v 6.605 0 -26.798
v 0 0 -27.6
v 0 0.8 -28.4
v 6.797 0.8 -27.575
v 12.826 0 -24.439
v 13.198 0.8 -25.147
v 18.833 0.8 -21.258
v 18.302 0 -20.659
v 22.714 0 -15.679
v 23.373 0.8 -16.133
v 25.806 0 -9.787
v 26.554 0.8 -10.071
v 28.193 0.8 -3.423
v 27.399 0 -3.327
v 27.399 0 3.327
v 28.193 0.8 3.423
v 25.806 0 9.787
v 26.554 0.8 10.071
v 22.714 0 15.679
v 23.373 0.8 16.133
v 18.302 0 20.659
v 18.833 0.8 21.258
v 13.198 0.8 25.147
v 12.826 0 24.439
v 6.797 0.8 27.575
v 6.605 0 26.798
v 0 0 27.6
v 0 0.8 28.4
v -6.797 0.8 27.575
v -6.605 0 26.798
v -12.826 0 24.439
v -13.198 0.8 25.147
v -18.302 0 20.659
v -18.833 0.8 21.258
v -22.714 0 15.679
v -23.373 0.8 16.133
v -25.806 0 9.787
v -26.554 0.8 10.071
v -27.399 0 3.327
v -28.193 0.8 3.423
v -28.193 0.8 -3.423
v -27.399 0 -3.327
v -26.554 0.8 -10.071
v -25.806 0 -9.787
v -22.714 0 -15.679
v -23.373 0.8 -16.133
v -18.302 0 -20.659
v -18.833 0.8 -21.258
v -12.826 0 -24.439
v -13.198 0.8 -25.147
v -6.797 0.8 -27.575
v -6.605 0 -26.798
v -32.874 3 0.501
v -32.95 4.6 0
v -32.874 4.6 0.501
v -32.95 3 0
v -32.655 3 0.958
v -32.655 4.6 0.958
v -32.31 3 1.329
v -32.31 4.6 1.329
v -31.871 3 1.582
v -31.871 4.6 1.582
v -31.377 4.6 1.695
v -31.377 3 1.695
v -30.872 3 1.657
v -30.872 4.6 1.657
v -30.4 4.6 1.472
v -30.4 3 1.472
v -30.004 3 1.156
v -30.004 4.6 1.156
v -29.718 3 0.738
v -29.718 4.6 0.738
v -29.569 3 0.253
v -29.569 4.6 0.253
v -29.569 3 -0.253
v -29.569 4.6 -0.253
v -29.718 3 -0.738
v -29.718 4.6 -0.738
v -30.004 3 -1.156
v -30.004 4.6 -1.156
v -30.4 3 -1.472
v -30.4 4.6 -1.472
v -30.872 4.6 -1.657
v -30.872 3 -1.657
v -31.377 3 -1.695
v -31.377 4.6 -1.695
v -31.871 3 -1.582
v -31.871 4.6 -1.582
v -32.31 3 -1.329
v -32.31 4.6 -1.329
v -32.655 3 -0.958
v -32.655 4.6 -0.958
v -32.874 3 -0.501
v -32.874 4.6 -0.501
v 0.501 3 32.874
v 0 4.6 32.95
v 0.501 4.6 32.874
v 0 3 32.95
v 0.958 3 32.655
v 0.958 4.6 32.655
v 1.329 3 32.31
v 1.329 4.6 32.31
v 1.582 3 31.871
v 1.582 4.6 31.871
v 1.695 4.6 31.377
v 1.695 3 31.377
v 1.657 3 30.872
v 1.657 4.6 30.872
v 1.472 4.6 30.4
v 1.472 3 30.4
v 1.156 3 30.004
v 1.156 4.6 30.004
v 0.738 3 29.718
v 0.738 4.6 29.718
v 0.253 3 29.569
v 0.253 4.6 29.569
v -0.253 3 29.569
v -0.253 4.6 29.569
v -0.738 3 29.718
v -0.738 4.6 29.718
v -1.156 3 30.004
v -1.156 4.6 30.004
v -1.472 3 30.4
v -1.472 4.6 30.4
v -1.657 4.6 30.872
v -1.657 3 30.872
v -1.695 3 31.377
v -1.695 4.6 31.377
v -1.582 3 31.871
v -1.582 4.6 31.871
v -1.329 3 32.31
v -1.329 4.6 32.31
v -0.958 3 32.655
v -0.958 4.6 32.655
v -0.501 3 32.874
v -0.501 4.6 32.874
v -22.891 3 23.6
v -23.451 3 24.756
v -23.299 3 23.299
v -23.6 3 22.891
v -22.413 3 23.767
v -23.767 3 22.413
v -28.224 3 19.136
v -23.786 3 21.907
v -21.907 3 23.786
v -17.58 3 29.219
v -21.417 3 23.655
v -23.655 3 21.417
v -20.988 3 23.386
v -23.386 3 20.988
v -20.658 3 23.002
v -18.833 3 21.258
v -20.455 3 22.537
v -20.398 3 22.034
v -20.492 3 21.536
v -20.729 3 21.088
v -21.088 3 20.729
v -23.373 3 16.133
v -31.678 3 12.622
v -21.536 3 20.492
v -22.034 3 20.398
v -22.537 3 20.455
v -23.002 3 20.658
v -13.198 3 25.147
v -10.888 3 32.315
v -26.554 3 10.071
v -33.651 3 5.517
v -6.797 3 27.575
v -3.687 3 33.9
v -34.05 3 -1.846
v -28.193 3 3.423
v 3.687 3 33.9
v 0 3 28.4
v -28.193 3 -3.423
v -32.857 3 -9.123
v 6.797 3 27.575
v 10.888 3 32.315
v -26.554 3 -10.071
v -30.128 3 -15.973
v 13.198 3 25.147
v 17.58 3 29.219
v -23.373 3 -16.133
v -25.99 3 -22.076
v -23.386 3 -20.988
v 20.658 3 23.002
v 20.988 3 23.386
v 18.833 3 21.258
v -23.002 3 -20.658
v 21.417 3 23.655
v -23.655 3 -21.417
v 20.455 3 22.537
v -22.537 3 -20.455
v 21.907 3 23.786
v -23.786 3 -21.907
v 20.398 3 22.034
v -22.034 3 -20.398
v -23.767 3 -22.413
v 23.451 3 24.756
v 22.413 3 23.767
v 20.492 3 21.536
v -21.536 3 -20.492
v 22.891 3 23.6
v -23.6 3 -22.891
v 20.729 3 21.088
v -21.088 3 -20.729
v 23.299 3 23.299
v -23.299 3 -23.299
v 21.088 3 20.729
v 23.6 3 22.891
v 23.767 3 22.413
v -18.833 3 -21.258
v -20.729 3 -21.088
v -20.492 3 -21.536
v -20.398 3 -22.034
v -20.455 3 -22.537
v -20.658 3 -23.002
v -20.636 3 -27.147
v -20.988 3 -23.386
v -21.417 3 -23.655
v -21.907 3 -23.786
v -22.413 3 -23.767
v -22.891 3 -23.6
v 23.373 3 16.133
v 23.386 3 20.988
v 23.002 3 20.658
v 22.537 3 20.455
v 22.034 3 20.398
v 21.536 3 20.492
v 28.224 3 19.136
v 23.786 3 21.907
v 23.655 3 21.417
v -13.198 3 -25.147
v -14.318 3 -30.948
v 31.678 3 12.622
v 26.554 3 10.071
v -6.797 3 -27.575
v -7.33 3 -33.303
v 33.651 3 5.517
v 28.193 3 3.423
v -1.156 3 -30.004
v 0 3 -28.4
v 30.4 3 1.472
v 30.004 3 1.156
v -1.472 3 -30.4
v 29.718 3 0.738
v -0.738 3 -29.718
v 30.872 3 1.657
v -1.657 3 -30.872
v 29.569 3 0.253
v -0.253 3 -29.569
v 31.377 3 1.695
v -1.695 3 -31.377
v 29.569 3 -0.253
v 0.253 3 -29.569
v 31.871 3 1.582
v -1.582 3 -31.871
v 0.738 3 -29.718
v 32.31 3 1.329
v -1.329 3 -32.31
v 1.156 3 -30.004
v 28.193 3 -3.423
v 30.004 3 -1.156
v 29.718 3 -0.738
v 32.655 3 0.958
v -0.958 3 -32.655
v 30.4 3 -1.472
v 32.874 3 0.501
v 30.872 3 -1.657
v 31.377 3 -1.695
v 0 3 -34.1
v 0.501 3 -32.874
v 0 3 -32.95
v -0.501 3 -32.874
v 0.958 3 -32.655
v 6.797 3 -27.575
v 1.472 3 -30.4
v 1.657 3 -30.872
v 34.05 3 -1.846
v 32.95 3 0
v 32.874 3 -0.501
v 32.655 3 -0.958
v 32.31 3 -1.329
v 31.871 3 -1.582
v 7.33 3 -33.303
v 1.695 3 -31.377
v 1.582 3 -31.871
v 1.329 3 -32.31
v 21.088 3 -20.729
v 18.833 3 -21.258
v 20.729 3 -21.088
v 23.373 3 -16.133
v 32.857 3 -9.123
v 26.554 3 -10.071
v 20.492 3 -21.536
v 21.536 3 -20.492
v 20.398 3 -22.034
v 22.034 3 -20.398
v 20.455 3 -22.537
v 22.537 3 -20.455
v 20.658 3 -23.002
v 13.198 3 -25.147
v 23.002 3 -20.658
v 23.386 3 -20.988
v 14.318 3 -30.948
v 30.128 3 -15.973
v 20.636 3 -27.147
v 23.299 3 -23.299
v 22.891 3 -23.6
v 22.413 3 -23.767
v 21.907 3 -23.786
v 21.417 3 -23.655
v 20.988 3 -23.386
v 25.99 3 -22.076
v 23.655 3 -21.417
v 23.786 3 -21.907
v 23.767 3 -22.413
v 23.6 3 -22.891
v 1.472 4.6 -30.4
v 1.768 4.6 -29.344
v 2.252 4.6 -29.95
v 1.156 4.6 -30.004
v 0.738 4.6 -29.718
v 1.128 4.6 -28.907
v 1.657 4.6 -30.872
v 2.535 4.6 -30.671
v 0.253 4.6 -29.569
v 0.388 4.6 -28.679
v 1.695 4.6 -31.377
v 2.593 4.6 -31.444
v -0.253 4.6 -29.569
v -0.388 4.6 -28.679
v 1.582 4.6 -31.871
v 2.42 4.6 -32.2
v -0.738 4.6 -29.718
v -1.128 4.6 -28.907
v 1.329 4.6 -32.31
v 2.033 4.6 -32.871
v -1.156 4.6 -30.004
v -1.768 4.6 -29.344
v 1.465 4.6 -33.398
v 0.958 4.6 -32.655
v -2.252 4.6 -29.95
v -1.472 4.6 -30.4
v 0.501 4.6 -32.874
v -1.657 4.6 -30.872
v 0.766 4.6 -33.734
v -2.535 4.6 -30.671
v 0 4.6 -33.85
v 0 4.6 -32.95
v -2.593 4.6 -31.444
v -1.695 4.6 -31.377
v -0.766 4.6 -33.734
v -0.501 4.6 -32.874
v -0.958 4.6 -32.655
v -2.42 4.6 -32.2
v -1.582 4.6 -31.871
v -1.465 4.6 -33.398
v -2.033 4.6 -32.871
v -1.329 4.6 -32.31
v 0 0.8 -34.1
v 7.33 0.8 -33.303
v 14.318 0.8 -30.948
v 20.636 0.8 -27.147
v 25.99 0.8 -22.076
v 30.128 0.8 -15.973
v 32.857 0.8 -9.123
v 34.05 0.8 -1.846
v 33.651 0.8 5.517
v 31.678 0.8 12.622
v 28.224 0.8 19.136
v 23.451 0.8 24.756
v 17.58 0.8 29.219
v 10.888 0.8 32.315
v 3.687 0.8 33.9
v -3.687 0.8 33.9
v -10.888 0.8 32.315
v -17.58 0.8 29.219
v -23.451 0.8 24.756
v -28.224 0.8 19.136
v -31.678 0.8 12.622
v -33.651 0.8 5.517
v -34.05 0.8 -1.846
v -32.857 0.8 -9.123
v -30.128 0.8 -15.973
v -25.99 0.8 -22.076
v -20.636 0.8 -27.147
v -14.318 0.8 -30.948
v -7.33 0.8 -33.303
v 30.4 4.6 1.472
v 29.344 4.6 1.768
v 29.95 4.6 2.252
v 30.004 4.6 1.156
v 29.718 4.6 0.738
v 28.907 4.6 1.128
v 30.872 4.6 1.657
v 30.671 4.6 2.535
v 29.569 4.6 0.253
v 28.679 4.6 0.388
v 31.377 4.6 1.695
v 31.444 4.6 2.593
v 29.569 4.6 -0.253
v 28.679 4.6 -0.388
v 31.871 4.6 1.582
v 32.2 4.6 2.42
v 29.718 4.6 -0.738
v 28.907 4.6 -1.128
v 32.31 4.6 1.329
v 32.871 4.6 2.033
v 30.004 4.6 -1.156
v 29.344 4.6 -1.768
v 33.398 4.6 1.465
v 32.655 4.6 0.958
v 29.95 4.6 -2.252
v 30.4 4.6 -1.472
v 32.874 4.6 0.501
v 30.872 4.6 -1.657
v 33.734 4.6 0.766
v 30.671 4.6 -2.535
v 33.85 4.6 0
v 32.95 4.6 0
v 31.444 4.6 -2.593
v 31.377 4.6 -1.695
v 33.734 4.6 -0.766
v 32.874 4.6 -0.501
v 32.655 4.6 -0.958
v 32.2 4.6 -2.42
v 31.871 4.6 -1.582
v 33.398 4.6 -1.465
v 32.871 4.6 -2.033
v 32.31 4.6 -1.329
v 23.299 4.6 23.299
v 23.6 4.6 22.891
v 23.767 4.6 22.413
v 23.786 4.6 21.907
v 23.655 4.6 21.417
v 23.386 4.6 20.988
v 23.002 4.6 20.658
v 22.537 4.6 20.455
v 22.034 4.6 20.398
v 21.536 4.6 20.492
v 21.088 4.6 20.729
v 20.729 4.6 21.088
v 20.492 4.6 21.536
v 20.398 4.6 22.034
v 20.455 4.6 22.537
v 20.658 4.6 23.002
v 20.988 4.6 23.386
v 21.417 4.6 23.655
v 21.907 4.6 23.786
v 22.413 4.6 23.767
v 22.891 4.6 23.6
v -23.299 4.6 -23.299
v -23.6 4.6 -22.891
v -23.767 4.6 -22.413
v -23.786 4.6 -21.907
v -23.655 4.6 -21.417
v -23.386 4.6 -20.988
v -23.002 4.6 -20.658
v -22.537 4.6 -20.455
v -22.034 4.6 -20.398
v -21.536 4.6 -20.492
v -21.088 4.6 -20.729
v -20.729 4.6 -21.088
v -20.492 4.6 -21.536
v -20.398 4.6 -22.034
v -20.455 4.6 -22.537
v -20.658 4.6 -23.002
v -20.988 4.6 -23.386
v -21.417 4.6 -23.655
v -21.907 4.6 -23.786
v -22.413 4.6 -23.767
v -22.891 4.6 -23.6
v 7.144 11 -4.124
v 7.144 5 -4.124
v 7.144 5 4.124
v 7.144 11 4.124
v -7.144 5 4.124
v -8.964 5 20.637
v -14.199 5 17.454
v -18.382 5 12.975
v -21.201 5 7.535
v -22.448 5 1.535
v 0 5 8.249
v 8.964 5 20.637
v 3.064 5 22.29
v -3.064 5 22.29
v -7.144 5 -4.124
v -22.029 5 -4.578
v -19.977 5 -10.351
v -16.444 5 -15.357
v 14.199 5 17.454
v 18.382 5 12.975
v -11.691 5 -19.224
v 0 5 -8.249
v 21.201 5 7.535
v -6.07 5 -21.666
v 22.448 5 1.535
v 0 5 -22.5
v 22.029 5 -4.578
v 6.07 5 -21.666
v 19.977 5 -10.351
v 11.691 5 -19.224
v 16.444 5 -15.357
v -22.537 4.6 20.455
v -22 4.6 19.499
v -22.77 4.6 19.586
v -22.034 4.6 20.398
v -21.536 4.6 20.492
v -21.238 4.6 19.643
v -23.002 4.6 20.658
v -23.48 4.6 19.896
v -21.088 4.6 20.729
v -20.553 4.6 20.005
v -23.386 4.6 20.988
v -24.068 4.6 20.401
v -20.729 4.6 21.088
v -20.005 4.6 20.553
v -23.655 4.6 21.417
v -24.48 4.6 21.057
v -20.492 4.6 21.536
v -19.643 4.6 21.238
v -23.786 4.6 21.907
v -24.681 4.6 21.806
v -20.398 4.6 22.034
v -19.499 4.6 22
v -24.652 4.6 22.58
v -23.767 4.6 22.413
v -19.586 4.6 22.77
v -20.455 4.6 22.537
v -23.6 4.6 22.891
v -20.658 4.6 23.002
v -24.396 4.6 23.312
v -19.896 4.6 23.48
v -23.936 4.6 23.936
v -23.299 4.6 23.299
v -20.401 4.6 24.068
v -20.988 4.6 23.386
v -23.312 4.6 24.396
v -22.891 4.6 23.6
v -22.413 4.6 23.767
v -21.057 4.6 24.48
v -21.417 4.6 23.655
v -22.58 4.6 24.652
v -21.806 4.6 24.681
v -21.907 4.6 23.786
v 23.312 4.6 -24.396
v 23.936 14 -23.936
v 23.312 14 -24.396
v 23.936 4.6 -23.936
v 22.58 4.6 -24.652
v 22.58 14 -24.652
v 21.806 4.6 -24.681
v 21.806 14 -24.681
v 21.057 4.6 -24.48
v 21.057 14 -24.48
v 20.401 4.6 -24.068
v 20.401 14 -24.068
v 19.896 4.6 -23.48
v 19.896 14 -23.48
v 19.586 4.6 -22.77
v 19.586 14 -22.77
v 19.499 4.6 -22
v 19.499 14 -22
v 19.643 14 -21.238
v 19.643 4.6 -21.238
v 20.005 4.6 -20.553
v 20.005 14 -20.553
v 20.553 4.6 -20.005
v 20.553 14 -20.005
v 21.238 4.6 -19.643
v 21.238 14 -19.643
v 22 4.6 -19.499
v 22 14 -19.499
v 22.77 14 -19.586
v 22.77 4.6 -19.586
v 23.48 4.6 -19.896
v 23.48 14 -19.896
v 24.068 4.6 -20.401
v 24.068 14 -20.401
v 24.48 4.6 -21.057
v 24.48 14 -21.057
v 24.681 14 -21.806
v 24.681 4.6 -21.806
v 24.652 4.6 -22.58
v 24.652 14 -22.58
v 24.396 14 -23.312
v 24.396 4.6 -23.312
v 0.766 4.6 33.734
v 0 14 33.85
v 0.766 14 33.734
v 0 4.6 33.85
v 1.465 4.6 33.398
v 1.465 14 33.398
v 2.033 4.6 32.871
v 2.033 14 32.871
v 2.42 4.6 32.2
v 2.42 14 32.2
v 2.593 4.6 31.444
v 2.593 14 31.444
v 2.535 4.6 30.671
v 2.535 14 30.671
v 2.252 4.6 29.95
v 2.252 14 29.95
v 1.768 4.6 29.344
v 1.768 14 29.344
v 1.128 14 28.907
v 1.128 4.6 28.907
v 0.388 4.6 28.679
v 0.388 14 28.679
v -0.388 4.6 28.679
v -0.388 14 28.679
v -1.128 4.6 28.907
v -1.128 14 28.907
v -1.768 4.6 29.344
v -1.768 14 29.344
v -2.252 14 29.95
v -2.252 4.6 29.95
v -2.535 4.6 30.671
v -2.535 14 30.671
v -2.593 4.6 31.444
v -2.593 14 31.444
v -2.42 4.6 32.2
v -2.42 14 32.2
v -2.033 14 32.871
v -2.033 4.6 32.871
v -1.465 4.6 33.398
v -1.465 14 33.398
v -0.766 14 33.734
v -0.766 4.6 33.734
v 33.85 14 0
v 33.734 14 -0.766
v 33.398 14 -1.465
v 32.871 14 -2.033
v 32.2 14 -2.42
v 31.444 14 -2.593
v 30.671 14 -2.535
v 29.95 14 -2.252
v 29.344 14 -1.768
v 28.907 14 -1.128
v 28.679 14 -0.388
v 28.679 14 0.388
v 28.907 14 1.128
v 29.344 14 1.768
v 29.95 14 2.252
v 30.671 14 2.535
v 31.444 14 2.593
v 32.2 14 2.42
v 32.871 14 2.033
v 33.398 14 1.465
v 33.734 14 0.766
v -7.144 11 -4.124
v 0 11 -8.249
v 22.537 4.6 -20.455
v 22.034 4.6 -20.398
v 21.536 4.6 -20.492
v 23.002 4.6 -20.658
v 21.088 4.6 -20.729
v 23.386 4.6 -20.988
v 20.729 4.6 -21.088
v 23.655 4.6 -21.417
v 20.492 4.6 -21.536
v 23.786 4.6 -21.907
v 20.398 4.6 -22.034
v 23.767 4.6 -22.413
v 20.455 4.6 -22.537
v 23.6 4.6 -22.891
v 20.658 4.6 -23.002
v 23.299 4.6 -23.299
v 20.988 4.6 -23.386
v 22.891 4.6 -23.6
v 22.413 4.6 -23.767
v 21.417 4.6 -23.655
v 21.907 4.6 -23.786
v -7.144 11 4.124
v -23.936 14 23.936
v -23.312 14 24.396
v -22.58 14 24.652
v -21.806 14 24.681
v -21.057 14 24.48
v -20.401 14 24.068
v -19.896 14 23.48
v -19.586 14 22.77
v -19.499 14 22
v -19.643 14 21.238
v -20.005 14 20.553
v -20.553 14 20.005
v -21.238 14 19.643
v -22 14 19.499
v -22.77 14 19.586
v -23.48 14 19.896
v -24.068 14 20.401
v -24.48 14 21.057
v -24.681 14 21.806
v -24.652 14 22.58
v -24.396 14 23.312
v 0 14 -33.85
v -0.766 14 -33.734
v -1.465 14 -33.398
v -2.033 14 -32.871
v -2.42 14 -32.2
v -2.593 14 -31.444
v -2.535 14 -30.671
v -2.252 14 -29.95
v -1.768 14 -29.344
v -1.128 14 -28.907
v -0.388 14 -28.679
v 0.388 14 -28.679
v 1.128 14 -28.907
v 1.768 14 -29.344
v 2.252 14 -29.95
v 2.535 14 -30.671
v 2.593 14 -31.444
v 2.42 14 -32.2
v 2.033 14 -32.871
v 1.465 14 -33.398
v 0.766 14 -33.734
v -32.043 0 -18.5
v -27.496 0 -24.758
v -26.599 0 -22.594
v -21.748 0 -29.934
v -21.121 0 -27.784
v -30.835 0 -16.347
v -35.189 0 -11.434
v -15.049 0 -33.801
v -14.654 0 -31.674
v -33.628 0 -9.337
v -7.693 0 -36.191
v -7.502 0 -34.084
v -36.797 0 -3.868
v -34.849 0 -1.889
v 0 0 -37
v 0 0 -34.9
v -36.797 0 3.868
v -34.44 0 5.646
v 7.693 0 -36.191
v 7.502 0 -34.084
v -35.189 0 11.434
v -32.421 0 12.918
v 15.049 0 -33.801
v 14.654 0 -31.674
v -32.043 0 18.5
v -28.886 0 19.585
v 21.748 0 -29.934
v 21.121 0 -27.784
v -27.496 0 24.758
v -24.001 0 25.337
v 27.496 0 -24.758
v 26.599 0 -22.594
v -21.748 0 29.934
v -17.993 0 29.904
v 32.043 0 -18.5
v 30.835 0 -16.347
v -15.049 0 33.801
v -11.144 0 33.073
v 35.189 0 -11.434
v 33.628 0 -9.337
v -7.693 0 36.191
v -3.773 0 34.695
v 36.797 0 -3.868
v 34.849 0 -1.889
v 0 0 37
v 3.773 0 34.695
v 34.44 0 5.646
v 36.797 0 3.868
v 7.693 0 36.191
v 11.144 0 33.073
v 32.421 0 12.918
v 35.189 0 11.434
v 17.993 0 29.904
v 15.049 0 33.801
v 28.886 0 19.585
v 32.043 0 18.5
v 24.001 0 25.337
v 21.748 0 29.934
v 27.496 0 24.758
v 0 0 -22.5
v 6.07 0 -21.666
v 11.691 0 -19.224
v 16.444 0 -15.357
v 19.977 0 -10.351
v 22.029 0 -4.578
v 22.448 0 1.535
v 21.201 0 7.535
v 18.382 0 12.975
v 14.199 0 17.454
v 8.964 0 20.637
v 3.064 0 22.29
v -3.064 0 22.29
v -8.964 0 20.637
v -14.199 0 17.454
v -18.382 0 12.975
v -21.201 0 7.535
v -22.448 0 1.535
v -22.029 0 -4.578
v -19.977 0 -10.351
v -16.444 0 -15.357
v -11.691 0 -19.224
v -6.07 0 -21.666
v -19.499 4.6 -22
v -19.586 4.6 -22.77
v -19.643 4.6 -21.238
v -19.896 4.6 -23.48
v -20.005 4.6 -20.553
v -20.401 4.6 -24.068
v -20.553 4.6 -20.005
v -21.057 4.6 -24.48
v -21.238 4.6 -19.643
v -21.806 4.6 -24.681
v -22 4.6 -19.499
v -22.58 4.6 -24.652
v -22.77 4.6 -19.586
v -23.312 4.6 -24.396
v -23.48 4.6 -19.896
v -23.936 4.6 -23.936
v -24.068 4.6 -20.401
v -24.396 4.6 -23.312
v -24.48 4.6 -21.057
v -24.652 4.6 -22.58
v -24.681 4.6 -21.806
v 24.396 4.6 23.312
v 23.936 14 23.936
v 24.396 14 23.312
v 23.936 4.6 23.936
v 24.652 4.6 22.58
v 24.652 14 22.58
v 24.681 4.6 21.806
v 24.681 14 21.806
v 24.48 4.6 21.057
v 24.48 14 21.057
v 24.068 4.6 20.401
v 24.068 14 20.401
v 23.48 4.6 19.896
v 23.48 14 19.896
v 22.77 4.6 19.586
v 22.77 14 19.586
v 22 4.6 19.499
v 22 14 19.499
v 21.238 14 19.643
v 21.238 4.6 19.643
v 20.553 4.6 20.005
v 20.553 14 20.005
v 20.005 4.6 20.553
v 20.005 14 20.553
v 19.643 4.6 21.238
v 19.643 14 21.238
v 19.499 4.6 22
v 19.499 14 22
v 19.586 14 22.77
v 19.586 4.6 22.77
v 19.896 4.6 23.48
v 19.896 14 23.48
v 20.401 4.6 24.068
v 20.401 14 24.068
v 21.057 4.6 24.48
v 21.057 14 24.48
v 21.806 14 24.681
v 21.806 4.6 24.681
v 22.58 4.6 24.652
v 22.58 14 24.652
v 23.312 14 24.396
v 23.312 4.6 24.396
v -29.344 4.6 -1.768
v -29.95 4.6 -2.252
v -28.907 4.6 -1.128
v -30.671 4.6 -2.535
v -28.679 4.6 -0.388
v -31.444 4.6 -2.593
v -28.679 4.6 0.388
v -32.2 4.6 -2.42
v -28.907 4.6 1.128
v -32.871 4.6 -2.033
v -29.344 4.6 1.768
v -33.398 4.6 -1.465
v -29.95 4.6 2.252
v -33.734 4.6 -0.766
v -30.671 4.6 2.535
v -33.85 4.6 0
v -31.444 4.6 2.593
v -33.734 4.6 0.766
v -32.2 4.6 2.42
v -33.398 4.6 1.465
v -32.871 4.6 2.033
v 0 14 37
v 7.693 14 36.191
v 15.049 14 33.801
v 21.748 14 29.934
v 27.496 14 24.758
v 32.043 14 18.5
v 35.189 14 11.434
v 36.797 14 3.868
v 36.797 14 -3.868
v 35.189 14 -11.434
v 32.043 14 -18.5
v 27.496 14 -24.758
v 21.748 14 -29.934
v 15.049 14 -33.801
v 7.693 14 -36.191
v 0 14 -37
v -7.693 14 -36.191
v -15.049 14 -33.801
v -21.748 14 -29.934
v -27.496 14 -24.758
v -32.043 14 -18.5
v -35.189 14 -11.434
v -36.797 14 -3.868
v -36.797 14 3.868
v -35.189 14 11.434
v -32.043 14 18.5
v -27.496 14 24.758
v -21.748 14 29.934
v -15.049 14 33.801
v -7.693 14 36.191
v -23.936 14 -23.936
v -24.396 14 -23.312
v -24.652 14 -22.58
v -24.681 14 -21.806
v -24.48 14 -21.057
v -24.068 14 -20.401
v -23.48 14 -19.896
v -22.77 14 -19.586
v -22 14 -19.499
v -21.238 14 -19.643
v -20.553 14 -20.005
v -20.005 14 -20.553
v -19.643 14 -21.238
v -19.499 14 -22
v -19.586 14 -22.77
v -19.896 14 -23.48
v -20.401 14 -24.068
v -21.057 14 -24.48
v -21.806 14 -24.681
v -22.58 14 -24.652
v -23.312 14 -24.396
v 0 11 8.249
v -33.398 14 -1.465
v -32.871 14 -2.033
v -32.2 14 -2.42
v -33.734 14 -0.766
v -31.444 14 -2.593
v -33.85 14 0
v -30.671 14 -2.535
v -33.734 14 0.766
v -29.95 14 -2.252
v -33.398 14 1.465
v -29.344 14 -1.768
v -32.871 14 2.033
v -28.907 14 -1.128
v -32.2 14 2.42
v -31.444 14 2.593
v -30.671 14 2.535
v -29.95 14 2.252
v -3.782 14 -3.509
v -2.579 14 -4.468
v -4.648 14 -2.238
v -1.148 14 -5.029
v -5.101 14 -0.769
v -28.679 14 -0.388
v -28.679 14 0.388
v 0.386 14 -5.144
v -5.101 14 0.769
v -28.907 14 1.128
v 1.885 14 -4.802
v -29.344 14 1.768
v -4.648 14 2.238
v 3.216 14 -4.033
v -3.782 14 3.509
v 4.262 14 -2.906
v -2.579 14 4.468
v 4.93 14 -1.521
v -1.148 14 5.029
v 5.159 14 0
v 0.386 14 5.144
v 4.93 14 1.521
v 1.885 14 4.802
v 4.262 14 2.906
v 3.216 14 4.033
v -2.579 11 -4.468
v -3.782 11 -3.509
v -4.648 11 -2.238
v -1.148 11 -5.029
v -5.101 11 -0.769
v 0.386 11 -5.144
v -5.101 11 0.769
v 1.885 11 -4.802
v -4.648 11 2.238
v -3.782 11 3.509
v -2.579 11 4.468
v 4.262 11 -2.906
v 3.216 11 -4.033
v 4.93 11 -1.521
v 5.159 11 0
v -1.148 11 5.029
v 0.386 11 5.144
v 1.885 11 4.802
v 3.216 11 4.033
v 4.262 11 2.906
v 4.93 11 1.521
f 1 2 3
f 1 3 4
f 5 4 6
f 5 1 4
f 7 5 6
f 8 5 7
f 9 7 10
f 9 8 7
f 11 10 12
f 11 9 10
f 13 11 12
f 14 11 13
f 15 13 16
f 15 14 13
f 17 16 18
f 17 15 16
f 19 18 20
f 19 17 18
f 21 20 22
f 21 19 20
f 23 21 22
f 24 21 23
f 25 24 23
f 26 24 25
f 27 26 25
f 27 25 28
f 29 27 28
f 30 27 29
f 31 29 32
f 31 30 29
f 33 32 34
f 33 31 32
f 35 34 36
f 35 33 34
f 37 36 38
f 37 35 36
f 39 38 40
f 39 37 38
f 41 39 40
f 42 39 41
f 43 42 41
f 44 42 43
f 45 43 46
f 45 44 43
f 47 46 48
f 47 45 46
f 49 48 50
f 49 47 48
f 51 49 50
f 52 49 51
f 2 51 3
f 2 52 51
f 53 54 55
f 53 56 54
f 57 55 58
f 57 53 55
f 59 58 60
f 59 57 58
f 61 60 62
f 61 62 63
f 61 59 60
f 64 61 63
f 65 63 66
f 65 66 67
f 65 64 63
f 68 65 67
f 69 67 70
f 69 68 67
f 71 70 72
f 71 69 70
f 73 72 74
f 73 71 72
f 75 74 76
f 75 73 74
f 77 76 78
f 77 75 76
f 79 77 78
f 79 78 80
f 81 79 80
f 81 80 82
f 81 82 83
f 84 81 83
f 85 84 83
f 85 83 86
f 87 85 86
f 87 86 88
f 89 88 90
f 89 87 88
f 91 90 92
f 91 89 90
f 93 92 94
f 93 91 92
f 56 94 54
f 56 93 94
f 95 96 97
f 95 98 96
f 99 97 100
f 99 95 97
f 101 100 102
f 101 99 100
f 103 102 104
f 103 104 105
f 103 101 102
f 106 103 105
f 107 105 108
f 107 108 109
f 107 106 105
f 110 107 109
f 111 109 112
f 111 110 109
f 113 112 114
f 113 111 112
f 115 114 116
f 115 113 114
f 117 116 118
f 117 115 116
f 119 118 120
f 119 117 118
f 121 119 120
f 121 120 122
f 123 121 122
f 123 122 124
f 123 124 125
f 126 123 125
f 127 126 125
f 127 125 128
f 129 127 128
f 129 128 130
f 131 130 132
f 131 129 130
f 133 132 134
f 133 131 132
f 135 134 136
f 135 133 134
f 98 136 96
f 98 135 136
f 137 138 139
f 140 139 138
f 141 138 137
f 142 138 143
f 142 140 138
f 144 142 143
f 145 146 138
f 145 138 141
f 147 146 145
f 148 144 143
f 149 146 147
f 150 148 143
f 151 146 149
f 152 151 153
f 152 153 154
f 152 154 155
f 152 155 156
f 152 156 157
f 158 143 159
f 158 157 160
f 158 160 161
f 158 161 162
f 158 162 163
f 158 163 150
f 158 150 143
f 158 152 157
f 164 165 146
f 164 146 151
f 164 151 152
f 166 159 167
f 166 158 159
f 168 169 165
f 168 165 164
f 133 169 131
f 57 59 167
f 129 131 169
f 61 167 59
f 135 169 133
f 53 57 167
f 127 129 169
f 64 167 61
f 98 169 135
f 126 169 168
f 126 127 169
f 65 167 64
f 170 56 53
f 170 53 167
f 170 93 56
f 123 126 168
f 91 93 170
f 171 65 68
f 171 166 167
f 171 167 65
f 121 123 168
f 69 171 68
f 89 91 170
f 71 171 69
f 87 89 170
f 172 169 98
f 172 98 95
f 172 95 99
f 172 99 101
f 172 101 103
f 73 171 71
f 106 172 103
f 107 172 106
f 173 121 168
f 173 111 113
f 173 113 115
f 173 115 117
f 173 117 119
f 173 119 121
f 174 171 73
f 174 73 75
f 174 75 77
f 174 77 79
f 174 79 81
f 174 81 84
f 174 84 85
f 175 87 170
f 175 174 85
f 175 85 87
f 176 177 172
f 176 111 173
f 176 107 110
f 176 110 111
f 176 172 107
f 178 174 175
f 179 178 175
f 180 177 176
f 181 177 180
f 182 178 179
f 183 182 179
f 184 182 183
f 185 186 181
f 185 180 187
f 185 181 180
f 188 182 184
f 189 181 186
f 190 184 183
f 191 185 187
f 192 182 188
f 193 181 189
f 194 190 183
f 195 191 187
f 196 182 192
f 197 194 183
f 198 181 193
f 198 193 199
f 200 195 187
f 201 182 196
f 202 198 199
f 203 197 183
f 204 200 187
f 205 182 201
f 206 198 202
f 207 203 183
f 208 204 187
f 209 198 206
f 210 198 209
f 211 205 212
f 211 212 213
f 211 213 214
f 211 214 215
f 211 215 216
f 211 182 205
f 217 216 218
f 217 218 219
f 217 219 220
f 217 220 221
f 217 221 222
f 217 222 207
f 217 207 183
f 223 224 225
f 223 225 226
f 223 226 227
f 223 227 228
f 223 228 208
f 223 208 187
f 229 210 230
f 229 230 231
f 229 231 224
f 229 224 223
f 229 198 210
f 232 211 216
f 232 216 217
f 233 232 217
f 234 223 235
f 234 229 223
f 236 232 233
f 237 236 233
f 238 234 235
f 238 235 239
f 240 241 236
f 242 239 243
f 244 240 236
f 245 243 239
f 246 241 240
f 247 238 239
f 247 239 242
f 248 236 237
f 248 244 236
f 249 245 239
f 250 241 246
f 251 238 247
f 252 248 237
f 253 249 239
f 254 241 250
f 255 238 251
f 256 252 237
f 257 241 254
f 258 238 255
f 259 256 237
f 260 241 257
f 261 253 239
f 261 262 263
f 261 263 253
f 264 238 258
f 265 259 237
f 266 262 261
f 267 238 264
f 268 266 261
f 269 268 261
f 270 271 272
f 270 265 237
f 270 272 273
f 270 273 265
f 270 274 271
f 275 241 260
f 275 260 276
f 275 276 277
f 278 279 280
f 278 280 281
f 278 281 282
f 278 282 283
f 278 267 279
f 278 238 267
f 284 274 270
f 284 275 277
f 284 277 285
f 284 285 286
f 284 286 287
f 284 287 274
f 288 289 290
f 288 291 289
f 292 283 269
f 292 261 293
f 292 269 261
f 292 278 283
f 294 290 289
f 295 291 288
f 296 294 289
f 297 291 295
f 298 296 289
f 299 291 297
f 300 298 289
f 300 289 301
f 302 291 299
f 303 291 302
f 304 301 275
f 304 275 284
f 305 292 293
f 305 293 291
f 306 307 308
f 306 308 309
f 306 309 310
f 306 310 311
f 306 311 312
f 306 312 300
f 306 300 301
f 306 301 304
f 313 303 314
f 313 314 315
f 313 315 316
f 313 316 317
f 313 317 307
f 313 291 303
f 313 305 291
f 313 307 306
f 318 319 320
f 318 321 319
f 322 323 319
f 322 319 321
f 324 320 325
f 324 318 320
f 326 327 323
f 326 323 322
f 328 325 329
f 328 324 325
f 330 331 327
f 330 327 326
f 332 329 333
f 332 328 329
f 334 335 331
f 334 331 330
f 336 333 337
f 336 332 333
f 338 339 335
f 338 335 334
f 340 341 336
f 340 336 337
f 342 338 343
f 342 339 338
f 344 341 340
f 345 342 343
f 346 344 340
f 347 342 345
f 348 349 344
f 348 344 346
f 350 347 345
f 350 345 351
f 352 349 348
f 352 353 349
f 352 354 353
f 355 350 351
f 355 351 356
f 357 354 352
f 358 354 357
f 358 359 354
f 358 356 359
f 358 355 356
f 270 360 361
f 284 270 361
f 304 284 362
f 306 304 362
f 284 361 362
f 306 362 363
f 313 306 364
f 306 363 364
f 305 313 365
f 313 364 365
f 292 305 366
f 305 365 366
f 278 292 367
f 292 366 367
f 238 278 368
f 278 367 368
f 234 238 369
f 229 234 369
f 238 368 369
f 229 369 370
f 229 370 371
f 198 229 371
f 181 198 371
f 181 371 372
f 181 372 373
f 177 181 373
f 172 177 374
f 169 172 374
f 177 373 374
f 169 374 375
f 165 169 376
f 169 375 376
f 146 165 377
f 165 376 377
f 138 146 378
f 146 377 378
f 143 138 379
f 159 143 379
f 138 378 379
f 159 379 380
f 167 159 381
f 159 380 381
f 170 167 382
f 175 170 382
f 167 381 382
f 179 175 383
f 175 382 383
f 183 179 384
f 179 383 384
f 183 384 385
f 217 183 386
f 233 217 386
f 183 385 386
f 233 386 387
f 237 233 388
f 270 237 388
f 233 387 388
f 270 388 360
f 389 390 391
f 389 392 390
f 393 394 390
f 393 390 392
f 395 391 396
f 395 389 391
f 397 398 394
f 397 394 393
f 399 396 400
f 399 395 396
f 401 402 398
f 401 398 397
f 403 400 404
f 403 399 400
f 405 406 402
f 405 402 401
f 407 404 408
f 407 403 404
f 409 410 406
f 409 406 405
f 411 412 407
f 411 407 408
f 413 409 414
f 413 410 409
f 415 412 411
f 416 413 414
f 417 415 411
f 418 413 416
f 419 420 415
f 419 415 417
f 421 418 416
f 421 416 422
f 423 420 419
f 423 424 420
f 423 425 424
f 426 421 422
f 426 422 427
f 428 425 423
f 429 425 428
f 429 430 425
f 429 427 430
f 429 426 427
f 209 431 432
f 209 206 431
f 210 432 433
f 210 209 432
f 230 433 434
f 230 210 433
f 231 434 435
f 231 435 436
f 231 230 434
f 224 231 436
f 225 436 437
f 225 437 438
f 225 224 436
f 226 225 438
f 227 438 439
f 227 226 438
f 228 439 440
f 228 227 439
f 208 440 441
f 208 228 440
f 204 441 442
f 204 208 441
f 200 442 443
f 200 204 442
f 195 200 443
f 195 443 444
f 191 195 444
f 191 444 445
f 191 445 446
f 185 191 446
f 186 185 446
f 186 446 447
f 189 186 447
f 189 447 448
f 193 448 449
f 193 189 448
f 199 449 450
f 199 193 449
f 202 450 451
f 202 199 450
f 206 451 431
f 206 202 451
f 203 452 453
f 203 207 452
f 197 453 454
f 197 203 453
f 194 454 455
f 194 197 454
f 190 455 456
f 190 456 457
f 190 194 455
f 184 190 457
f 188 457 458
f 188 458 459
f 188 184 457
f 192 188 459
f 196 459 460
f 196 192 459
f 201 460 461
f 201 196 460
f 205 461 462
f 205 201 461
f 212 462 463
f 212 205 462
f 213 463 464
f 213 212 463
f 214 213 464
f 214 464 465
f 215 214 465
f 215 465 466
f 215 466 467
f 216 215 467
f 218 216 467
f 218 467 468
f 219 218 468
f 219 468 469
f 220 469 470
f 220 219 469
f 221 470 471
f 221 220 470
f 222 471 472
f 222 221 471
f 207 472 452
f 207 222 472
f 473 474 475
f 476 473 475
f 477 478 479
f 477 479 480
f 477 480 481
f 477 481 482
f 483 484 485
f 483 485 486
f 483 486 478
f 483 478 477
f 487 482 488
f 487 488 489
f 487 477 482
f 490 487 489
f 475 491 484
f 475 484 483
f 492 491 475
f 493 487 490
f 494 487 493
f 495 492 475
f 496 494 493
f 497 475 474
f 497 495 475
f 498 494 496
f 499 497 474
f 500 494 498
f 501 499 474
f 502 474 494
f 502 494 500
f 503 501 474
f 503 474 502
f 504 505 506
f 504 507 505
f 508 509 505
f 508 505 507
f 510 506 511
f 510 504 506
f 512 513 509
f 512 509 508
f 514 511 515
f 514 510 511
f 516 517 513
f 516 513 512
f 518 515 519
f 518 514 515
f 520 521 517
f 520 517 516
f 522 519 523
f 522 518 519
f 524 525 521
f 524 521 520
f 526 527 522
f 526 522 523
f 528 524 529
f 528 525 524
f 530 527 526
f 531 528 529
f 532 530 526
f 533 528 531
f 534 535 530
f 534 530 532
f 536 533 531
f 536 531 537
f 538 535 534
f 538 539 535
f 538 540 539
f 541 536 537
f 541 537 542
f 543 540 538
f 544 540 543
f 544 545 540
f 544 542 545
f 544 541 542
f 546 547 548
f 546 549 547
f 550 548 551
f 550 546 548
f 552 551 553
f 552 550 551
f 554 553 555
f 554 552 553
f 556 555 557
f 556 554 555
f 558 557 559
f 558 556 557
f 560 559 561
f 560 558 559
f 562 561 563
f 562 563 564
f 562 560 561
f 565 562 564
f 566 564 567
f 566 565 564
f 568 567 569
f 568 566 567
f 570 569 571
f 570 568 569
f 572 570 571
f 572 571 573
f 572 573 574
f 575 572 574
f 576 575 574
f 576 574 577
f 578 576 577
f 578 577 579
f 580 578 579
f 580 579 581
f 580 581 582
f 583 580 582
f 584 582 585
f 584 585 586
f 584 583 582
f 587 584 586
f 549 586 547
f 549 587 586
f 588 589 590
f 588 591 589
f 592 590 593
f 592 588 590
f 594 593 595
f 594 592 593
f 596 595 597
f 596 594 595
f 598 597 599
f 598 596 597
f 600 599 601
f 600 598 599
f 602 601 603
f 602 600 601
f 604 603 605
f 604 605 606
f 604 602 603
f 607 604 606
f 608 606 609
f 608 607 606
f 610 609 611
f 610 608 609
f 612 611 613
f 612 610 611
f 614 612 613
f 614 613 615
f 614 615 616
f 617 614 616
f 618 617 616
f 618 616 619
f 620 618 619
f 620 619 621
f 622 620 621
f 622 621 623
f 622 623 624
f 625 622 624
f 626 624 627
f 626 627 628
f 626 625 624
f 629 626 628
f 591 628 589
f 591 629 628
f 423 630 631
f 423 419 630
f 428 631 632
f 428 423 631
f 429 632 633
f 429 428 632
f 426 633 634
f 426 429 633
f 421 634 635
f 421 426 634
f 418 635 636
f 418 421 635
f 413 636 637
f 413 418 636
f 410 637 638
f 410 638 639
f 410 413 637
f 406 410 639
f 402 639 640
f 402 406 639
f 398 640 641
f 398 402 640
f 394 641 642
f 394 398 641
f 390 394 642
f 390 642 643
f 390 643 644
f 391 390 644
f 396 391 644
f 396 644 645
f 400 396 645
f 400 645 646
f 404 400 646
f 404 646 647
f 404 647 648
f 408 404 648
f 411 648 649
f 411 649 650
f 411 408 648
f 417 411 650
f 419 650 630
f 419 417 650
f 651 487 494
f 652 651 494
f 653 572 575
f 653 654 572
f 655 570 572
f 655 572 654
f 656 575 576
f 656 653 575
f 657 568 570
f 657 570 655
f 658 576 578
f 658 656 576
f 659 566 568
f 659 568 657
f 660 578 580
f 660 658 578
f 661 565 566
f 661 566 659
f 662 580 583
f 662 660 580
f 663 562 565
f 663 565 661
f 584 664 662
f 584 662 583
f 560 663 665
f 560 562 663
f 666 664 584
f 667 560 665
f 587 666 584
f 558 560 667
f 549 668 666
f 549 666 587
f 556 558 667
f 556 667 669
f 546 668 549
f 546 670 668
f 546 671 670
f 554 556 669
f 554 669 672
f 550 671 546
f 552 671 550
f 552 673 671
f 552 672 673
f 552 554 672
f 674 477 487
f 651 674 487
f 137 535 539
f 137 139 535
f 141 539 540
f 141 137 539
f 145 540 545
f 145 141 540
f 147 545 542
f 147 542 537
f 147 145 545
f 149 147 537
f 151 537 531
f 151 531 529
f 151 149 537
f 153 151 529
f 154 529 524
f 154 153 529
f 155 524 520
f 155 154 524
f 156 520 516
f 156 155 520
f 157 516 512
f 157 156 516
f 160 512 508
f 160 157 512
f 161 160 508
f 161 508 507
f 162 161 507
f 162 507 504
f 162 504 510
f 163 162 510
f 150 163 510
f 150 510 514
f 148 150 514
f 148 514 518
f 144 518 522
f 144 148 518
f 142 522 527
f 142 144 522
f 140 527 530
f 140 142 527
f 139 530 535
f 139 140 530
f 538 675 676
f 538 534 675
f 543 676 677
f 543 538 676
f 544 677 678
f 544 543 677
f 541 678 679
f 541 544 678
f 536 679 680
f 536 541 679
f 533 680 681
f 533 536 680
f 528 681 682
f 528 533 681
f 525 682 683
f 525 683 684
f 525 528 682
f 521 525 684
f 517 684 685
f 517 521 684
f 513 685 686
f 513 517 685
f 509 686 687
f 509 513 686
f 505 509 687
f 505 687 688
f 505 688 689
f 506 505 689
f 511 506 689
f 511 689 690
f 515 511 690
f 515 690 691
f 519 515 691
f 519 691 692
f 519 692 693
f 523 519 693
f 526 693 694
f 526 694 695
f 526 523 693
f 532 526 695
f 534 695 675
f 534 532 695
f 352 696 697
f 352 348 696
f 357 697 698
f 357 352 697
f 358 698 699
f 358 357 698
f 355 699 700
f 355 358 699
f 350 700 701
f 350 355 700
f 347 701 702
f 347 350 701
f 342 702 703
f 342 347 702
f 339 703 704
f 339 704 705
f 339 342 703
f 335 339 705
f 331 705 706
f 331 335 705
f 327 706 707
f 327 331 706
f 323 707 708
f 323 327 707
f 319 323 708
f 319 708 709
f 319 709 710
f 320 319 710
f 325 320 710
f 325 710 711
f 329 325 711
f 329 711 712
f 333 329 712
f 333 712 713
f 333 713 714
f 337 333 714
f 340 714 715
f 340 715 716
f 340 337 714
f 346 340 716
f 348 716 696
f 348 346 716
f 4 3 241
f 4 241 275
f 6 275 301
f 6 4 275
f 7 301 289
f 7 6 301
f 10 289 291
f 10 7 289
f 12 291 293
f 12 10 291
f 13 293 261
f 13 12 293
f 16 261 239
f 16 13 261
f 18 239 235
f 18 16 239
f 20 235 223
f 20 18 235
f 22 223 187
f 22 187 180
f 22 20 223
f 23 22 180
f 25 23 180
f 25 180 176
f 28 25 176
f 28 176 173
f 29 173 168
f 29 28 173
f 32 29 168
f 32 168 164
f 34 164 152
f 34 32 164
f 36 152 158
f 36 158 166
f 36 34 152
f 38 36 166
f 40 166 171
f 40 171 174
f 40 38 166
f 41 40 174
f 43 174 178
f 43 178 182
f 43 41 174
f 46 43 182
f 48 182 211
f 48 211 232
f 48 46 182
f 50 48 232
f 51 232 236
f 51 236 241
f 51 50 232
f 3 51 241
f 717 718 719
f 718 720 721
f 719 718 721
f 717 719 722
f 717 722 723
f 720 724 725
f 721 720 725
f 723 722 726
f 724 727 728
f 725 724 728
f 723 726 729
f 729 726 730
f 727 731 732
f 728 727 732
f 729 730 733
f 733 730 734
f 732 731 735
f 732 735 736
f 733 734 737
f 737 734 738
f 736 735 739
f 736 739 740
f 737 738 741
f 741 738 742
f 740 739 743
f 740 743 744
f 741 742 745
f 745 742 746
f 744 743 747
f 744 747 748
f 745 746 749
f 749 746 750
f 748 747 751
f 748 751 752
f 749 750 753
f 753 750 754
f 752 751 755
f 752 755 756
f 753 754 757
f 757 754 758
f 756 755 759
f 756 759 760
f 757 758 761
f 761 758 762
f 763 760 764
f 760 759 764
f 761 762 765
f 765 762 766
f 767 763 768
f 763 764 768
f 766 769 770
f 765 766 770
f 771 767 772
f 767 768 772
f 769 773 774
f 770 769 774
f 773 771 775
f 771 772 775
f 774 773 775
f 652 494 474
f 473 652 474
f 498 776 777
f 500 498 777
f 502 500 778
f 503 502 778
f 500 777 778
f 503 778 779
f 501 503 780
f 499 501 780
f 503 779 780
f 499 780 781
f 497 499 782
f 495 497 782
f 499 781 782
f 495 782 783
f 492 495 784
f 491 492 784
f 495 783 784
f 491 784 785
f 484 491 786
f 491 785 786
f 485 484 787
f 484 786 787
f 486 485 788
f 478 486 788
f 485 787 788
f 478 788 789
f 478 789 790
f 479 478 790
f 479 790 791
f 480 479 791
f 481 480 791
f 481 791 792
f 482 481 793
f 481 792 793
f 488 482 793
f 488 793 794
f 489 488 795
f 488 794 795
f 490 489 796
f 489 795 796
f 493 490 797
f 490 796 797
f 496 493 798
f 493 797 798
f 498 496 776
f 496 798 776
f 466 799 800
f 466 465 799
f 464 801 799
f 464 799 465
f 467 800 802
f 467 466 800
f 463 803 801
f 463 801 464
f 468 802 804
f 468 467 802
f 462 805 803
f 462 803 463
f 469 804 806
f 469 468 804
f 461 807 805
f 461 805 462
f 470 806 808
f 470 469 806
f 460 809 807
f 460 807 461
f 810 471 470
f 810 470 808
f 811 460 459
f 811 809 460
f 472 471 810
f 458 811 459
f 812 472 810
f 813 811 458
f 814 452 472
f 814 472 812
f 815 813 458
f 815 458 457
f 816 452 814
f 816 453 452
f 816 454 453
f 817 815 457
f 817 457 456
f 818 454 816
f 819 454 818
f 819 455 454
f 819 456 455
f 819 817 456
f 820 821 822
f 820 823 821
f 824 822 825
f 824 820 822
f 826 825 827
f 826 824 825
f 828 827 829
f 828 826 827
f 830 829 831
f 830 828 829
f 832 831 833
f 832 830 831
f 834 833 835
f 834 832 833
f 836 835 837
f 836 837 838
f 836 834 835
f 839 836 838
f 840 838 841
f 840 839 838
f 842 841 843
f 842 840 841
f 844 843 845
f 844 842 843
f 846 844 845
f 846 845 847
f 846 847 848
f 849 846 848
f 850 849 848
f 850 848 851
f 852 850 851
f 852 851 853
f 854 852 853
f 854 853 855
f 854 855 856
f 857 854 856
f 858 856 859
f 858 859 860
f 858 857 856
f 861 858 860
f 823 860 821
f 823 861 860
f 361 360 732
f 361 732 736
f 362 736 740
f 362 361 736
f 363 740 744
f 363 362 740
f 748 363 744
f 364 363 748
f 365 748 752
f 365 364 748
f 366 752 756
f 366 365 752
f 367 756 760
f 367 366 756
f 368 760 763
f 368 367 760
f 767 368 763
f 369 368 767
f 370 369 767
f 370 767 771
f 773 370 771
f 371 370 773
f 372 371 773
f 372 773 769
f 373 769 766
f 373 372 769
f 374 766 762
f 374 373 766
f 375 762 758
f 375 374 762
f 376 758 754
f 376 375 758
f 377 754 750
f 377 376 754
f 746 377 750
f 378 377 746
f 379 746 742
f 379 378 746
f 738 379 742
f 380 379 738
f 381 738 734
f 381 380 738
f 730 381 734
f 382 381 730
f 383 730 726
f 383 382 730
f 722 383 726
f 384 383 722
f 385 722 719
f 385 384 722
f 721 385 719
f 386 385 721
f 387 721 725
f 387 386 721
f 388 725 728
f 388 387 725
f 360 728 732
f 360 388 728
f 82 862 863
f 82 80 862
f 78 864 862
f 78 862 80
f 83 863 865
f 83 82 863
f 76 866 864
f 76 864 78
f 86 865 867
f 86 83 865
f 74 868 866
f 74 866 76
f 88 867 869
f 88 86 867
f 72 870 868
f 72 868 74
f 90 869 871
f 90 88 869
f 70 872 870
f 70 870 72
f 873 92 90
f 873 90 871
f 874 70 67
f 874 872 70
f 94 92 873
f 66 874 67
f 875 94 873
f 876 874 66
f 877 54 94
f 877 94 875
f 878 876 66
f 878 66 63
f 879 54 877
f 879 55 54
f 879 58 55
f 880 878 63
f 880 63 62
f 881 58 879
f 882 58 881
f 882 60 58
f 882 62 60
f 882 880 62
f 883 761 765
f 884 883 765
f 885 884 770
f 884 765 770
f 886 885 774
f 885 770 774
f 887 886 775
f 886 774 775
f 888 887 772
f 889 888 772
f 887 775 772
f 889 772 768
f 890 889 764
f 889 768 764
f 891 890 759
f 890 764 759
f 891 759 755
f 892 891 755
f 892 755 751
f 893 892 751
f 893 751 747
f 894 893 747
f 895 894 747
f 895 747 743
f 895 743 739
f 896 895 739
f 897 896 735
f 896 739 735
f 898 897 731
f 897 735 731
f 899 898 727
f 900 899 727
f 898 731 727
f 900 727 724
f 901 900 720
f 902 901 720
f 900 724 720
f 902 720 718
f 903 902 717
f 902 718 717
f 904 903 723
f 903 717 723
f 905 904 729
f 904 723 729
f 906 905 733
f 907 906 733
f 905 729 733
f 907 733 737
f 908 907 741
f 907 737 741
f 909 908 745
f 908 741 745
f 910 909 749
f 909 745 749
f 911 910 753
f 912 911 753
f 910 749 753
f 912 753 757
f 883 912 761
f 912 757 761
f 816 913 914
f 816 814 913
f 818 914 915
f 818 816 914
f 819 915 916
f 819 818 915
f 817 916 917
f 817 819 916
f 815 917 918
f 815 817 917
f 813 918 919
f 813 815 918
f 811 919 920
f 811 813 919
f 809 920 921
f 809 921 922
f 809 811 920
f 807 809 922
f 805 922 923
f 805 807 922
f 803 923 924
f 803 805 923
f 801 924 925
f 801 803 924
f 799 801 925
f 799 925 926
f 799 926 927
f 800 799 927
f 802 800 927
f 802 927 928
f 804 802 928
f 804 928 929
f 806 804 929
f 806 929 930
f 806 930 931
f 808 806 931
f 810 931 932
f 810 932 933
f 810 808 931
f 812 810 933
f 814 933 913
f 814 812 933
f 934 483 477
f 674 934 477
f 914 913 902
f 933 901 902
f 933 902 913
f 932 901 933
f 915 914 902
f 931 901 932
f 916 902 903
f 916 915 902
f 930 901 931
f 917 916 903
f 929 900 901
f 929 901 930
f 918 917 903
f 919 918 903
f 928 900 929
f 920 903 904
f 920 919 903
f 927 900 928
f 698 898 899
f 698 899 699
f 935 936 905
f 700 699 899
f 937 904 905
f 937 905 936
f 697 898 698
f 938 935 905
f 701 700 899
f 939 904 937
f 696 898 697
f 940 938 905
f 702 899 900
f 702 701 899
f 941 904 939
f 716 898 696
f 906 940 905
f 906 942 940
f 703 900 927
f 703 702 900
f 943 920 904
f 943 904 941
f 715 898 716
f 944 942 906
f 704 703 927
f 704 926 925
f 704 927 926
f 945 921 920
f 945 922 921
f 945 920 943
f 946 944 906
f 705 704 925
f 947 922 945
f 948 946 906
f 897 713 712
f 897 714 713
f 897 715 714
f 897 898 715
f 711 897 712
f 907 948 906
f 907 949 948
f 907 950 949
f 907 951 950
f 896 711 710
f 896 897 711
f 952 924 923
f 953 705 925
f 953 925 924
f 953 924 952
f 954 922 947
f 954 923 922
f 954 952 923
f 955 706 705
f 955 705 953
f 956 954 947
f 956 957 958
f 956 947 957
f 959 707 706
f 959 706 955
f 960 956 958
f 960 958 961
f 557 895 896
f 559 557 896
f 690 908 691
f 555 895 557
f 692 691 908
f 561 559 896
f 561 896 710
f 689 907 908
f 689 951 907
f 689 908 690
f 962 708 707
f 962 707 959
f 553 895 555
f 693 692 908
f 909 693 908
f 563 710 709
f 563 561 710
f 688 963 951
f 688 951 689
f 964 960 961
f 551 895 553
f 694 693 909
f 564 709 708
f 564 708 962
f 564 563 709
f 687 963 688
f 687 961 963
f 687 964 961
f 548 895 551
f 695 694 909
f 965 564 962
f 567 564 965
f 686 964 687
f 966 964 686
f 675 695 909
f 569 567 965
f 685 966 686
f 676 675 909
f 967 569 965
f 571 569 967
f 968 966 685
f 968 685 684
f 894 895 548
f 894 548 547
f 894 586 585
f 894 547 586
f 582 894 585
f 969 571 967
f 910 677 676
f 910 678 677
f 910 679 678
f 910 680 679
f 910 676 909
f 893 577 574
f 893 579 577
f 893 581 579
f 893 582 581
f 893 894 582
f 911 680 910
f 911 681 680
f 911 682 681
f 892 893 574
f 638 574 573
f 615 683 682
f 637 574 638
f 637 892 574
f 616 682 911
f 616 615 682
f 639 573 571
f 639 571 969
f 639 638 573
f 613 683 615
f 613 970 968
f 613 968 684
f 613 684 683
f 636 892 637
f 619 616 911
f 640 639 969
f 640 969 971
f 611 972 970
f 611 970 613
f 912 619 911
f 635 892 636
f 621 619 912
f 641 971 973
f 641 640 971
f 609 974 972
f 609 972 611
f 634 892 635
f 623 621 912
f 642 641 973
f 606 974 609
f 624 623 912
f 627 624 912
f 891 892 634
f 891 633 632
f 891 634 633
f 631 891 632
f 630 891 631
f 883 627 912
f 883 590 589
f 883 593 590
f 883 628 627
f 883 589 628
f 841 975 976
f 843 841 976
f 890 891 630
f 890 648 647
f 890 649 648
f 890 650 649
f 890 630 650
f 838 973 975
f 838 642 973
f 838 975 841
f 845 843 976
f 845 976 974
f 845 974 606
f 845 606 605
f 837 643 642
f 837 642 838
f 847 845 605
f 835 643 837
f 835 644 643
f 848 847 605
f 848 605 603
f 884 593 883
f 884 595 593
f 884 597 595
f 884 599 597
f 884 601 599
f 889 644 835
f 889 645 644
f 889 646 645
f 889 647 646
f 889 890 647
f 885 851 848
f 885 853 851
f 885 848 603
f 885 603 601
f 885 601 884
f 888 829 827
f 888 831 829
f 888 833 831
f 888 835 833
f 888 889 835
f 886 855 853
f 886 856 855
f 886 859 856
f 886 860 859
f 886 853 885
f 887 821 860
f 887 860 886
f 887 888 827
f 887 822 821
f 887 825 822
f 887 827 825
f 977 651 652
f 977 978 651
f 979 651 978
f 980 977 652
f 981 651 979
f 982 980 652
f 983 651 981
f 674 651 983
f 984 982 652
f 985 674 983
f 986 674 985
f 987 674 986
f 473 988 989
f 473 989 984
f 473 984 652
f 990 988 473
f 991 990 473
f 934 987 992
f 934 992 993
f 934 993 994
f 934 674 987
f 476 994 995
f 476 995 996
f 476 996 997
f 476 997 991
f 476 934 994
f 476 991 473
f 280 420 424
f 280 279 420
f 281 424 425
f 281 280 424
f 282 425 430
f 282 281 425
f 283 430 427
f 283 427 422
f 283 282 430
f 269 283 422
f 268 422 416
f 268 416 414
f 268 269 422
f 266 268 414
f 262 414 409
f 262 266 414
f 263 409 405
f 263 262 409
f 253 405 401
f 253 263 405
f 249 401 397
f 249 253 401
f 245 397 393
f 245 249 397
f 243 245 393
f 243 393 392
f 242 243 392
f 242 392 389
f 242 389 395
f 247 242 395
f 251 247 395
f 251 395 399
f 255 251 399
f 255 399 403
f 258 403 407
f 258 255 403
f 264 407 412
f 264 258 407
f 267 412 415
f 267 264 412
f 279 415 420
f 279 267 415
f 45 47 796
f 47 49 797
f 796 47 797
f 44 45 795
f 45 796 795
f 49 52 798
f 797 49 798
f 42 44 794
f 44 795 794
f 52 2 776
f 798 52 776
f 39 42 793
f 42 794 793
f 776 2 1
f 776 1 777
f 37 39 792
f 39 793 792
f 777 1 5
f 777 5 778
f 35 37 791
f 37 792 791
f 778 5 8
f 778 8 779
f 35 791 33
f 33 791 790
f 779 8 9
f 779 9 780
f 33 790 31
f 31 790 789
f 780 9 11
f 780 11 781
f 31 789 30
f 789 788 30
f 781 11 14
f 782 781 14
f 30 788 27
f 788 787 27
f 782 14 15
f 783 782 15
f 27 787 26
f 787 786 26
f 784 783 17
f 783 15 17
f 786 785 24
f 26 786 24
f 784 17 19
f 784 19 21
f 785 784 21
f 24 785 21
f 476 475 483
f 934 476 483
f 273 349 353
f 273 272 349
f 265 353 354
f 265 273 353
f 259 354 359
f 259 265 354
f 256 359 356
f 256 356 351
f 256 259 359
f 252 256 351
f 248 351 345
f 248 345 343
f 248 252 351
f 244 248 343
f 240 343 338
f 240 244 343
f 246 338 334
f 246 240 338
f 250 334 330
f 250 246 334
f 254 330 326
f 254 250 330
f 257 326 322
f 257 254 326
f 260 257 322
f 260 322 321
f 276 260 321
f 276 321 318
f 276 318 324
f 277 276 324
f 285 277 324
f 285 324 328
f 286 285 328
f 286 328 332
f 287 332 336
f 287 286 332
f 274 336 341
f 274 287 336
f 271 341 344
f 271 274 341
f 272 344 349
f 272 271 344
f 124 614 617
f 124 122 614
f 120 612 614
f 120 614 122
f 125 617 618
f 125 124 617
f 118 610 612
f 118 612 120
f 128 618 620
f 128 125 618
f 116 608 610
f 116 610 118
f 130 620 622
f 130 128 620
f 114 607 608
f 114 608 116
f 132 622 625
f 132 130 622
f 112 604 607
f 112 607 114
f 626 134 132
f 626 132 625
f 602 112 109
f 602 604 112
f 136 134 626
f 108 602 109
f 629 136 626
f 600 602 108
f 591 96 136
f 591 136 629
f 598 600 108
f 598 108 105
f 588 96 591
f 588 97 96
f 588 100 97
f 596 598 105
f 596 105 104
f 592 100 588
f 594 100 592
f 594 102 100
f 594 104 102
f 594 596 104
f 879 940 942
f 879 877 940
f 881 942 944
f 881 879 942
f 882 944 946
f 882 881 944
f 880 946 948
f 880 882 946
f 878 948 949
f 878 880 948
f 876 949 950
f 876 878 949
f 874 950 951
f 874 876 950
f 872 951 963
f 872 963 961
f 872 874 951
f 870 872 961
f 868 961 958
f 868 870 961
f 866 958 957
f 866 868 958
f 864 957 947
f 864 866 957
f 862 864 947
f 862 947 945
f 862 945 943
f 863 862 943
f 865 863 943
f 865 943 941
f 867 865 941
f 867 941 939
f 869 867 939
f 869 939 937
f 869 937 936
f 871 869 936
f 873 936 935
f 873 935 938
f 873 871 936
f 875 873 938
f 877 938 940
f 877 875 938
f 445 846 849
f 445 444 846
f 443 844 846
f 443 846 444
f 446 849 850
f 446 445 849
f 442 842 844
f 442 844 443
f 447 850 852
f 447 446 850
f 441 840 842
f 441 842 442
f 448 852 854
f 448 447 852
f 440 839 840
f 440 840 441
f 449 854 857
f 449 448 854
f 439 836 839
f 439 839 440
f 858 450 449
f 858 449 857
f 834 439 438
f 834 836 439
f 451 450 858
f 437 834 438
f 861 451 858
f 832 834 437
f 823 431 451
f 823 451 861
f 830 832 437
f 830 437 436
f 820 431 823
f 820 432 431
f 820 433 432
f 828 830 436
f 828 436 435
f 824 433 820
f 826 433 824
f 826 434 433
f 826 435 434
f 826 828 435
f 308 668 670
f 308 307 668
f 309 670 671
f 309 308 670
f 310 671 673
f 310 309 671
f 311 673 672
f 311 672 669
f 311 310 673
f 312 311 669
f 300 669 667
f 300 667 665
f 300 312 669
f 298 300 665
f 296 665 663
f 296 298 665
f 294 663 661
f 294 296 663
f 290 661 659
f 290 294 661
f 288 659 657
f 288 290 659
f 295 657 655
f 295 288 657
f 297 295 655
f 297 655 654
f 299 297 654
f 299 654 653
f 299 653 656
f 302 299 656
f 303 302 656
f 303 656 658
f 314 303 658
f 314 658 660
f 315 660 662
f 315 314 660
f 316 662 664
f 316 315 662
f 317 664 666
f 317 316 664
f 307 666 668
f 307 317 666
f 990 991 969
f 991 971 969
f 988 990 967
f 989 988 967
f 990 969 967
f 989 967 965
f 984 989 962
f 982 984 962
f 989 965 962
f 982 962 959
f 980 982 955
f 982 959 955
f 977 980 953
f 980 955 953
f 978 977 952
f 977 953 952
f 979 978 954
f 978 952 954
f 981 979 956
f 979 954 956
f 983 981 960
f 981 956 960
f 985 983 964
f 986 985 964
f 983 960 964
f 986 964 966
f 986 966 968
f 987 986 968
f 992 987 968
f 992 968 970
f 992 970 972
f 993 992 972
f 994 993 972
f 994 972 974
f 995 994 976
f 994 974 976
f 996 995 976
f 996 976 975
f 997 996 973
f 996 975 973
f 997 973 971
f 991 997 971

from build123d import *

# Parameters (mm, degrees)
SKETCH1_R               = 37
SKETCH1_R_2             = 1
BOSS_EXTRUDE1_DEPTH     = 14
F_3_8_CLEARANCE_HOLE1_D = 10.31748
SKETCH8_R               = 34.1
SKETCH8_R_2             = 28.4
CUT_EXTRUDE3_DEPTH      = 3
SKETCH9_R               = 22.5
CUT_EXTRUDE4_DEPTH      = 5
CUT_EXTRUDE2_DEPTH      = 6
CHAMFER1_SIZE           = 0.8
CIRPATTERN1_COUNT       = 8


with BuildPart() as part:
    # Sketch1 → Boss-Extrude1 (new body)
    with BuildSketch(Plane(origin=(0, 0, 0), x_dir=(1, 0, 0), z_dir=(0, 1, 0))):
        with Locations(Location((0, 0, 0), (0, 0, 270))):
            Circle(SKETCH1_R)
        with Locations(Location((0, 31.25, 0), (0, 0, 270))):
            Circle(SKETCH1_R_2, mode=Mode.SUBTRACT)
        with Locations(Location((22.097086912, 22.097086912, 0), (0, 0, 270))):
            Circle(SKETCH1_R_2, mode=Mode.SUBTRACT)
        with Locations(Location((31.25, 0, 0), (0, 0, 270))):
            Circle(SKETCH1_R_2, mode=Mode.SUBTRACT)
        with Locations(Location((22.097086912, -22.097086912, 0), (0, 0, 270))):
            Circle(SKETCH1_R_2, mode=Mode.SUBTRACT)
        with Locations(Location((0, -31.25, 0), (0, 0, 270))):
            Circle(SKETCH1_R_2, mode=Mode.SUBTRACT)
        with Locations(Location((-22.097086912, -22.097086912, 0), (0, 0, 270))):
            Circle(SKETCH1_R_2, mode=Mode.SUBTRACT)
        with Locations(Location((-31.25, 0, 0), (0, 0, 270))):
            Circle(SKETCH1_R_2, mode=Mode.SUBTRACT)
        with Locations(Location((-22.097086912, 22.097086912, 0), (0, 0, 270))):
            Circle(SKETCH1_R_2, mode=Mode.SUBTRACT)
    extrude(amount=BOSS_EXTRUDE1_DEPTH)

    # 3/8 Clearance Hole1 (through all)
    with Locations(Plane(origin=(0, 0, 0), x_dir=(-1, 0, 0), z_dir=(0, -1, 0))):
        with Locations((0, 0)):
            Hole(F_3_8_CLEARANCE_HOLE1_D / 2)

    # Sketch8 → Cut-Extrude3 (cut)
    with BuildSketch(Plane.XZ):
        with Locations(Location((0, 0, 0), (0, 0, 270))):
            Circle(SKETCH8_R)
        with Locations(Location((0, 0, 0), (0, 0, 270))):
            Circle(SKETCH8_R_2, mode=Mode.SUBTRACT)
    extrude(amount=-CUT_EXTRUDE3_DEPTH, mode=Mode.SUBTRACT)

    # Sketch9 → Cut-Extrude4 (cut)
    with BuildSketch(Plane.XZ):
        with Locations(Location((0, 0, 0), (0, 0, 270))):
            Circle(SKETCH9_R)
    extrude(amount=-CUT_EXTRUDE4_DEPTH, mode=Mode.SUBTRACT)

    # Sketch7 → Cut-Extrude2 (cut)
    with BuildSketch(Plane.XZ.offset(-5)):
        Polygon((0, 8.248891971), (-7.14375, 4.124445986), (-7.14375, -4.124445986), (0, -8.248891971), (7.14375, -4.124445986), (7.14375, 4.124445986), align=None)
    extrude(amount=-CUT_EXTRUDE2_DEPTH, mode=Mode.SUBTRACT)

    # Chamfer1
    chamfer1_edges = [part.edges().sort_by_distance(p)[0] for p in [
        (0, 0, 34.1),
        (0, 0, 28.4),
    ]]
    chamfer(chamfer1_edges, length=CHAMFER1_SIZE)

    # Sketch10 → Cut-Revolve1 (revolve, cut)
    with BuildSketch(Plane(origin=(0, 0, 0), x_dir=(0, 0, -1), z_dir=(1, 0, 0))):
        Polygon((32.95, 4.6), (32.95, 3), (31.25, 3), (31.25, 14), (33.85, 14), (33.85, 4.6), align=None)
    cut_revolve1 = revolve(axis=Axis((0, 14, -31.25), (0, 1, 0)), mode=Mode.SUBTRACT)

    # CirPattern1: Cut-Revolve1 ×8 about axis
    cirpattern1_axis = Axis((0, 0, 0), (0, 1, 0))
    for i in range(1, CIRPATTERN1_COUNT):
        add(cut_revolve1.rotate(cirpattern1_axis, i * 360 / CIRPATTERN1_COUNT), mode=Mode.SUBTRACT)


solid = part.part
